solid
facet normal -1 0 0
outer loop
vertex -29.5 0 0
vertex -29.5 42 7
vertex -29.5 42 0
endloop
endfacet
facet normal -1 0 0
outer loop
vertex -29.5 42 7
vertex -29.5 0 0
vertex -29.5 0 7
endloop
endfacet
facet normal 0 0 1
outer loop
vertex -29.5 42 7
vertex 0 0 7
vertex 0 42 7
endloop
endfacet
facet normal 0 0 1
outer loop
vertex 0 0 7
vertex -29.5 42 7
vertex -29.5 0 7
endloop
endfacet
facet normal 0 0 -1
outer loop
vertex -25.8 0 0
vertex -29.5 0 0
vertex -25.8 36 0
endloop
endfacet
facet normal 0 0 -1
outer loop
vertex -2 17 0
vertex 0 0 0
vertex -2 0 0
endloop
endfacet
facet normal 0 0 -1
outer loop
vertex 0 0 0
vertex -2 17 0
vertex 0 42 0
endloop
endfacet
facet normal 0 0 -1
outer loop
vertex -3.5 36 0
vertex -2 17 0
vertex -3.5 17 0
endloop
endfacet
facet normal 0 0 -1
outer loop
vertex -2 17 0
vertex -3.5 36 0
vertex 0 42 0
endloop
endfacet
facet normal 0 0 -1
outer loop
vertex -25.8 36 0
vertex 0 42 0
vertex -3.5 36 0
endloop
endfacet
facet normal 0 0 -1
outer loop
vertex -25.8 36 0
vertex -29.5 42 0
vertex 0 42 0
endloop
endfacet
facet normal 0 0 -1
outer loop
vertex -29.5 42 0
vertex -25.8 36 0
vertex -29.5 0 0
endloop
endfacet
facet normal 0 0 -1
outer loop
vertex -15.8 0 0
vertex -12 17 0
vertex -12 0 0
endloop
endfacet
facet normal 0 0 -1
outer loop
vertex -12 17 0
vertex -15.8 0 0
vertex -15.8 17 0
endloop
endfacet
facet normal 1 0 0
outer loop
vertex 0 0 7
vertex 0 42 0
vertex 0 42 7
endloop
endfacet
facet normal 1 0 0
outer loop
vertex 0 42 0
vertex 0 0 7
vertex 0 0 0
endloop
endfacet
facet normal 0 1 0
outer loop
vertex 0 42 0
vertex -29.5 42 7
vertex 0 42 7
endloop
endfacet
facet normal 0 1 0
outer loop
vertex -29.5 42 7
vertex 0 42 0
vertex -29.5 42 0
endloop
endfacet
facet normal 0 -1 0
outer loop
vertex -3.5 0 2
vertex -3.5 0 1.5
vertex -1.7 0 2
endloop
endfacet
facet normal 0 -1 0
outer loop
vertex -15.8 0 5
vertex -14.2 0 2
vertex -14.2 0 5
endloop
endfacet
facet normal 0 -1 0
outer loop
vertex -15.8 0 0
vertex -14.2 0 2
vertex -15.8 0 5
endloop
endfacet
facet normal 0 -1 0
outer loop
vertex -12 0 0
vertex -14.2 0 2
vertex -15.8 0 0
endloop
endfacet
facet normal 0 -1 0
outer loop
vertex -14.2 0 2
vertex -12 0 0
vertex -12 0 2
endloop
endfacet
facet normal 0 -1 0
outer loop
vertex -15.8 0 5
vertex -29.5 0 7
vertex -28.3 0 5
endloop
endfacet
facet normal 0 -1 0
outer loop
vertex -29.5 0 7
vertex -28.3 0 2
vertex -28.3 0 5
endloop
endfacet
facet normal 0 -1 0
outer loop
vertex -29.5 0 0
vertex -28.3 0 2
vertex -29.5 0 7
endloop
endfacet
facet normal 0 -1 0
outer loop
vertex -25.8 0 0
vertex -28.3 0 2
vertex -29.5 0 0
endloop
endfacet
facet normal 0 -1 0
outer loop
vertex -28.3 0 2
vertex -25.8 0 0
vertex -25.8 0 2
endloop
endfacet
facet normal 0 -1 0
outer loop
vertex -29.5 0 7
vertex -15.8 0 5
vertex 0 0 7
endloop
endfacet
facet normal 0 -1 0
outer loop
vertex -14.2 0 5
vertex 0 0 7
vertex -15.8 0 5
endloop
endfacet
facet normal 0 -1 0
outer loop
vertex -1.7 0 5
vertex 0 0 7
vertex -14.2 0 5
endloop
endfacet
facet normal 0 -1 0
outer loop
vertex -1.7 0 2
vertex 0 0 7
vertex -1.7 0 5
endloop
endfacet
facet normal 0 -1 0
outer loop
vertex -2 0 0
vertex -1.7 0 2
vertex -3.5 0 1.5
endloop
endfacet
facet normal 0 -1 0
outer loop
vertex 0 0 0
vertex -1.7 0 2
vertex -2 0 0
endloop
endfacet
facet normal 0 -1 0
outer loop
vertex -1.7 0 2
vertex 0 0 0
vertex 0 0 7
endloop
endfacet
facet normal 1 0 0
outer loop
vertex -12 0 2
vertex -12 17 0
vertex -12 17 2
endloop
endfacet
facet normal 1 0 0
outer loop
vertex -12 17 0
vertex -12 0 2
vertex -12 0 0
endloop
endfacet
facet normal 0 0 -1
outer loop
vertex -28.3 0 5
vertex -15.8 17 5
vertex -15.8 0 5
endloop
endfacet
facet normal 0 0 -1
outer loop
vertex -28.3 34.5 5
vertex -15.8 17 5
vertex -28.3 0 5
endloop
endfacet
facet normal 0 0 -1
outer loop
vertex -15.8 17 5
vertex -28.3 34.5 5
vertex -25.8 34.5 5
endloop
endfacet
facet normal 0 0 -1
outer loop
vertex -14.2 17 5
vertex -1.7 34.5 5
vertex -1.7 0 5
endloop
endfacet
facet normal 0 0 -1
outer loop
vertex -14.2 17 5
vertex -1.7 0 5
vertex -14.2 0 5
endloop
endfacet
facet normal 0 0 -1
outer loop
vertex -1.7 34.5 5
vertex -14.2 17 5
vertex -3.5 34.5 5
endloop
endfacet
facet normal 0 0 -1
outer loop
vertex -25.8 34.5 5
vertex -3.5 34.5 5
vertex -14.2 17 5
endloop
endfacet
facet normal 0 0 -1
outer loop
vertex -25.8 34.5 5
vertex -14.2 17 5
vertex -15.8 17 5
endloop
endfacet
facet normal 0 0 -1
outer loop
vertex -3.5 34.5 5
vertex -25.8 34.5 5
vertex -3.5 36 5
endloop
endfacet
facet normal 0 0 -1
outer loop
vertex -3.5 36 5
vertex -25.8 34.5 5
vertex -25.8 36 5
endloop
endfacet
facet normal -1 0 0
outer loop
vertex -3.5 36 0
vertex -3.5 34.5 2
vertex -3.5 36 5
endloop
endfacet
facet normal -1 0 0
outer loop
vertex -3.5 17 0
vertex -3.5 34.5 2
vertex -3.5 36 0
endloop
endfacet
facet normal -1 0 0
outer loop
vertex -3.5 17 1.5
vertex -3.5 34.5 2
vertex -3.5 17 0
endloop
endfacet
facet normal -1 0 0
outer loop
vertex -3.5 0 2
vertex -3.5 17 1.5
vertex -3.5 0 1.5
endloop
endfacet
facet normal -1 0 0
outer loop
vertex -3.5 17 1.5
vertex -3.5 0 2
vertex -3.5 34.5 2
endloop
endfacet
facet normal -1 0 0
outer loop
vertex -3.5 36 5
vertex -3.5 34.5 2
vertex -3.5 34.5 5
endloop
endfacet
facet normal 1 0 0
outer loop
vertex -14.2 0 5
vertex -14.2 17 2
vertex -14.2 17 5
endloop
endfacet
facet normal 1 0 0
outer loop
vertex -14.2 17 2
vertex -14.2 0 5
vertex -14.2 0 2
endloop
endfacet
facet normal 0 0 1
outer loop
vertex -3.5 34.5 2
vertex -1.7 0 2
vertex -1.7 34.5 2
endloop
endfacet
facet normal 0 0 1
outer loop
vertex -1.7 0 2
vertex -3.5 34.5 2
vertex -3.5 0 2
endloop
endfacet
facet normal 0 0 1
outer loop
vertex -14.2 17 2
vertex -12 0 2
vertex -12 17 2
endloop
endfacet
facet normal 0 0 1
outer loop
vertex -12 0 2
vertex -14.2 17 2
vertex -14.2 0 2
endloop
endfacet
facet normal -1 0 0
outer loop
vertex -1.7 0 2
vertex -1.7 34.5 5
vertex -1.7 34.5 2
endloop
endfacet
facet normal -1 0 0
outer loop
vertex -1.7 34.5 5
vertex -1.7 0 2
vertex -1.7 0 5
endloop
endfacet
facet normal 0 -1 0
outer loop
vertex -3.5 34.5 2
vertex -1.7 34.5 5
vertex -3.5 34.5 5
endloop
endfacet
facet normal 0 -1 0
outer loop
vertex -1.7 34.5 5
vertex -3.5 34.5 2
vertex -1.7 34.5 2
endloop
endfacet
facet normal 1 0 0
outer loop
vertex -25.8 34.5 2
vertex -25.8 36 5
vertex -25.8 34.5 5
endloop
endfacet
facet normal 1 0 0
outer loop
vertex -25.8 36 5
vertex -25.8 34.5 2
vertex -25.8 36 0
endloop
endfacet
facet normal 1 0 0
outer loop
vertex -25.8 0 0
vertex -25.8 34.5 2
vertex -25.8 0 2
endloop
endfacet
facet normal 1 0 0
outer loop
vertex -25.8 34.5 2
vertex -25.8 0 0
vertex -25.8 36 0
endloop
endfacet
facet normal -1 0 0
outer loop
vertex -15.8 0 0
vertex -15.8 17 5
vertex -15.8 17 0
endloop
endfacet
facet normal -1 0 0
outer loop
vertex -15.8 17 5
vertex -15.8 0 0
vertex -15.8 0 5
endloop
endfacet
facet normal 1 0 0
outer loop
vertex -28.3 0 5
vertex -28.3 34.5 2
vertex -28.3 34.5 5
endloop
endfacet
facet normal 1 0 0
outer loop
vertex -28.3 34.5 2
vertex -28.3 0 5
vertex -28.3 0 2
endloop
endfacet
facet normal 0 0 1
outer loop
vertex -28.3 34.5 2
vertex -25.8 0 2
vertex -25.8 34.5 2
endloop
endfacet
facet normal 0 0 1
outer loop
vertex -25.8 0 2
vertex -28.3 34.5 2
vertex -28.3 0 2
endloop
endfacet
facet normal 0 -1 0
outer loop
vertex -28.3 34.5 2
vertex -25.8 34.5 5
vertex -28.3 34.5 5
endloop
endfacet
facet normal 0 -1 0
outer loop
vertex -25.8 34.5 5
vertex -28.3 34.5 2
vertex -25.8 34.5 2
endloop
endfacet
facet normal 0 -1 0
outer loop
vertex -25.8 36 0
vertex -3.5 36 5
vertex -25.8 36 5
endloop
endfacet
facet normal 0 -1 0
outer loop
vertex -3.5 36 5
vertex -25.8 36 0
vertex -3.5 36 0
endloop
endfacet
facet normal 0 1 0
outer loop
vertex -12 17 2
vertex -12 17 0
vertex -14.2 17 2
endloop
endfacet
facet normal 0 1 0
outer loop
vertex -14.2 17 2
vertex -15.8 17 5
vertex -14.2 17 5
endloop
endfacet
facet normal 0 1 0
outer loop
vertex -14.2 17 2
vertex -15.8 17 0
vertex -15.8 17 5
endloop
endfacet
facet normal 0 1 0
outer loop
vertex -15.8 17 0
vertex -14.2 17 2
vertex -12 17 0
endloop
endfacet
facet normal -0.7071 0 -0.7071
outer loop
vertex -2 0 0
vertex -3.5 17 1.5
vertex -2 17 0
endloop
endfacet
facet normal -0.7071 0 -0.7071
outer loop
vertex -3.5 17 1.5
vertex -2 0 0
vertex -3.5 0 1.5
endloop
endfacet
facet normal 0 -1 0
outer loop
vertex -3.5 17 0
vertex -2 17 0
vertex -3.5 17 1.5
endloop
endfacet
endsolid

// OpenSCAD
width = 29.5;
length = 42;
height = 7;

edge_ridge_width = 3.5;
center_ridge_width = 3.8;
center_ridge_length = 17;

channel_bottom_width = 12.5;
right_channel_top_width = 8.5;
left_channel_top_width = 10;

difference() {
    mirror([1,0,0]){
    difference(){
  cube([width,length,height], false);
 
  //right channel top opening
  translate([edge_ridge_width,-0.5,-1]) 
    cube([8.5,18,6], false);

  //right channel bottom
  translate([1.7,-0.5,2]) 
    cube([12.5,35,3], false);

  translate([
    edge_ridge_width + 
    right_channel_top_width +
    center_ridge_width,-0.5,-1]) 
    cube([left_channel_top_width,18,6], false);

  //left channel bottom
  translate([edge_ridge_width+8.5+center_ridge_width,-0.5,2]) 
    cube([channel_bottom_width,35,3], false);
  
  //hollow
  translate([edge_ridge_width,center_ridge_length,-1]) 
    cube([
      right_channel_top_width +
      center_ridge_width +
      left_channel_top_width, 19, 6], false);
   
   //right channel edge
   translate([2,0,0])
     rotate([0,45,0])
       cube([width,center_ridge_length,height], false);
   }
}
}
